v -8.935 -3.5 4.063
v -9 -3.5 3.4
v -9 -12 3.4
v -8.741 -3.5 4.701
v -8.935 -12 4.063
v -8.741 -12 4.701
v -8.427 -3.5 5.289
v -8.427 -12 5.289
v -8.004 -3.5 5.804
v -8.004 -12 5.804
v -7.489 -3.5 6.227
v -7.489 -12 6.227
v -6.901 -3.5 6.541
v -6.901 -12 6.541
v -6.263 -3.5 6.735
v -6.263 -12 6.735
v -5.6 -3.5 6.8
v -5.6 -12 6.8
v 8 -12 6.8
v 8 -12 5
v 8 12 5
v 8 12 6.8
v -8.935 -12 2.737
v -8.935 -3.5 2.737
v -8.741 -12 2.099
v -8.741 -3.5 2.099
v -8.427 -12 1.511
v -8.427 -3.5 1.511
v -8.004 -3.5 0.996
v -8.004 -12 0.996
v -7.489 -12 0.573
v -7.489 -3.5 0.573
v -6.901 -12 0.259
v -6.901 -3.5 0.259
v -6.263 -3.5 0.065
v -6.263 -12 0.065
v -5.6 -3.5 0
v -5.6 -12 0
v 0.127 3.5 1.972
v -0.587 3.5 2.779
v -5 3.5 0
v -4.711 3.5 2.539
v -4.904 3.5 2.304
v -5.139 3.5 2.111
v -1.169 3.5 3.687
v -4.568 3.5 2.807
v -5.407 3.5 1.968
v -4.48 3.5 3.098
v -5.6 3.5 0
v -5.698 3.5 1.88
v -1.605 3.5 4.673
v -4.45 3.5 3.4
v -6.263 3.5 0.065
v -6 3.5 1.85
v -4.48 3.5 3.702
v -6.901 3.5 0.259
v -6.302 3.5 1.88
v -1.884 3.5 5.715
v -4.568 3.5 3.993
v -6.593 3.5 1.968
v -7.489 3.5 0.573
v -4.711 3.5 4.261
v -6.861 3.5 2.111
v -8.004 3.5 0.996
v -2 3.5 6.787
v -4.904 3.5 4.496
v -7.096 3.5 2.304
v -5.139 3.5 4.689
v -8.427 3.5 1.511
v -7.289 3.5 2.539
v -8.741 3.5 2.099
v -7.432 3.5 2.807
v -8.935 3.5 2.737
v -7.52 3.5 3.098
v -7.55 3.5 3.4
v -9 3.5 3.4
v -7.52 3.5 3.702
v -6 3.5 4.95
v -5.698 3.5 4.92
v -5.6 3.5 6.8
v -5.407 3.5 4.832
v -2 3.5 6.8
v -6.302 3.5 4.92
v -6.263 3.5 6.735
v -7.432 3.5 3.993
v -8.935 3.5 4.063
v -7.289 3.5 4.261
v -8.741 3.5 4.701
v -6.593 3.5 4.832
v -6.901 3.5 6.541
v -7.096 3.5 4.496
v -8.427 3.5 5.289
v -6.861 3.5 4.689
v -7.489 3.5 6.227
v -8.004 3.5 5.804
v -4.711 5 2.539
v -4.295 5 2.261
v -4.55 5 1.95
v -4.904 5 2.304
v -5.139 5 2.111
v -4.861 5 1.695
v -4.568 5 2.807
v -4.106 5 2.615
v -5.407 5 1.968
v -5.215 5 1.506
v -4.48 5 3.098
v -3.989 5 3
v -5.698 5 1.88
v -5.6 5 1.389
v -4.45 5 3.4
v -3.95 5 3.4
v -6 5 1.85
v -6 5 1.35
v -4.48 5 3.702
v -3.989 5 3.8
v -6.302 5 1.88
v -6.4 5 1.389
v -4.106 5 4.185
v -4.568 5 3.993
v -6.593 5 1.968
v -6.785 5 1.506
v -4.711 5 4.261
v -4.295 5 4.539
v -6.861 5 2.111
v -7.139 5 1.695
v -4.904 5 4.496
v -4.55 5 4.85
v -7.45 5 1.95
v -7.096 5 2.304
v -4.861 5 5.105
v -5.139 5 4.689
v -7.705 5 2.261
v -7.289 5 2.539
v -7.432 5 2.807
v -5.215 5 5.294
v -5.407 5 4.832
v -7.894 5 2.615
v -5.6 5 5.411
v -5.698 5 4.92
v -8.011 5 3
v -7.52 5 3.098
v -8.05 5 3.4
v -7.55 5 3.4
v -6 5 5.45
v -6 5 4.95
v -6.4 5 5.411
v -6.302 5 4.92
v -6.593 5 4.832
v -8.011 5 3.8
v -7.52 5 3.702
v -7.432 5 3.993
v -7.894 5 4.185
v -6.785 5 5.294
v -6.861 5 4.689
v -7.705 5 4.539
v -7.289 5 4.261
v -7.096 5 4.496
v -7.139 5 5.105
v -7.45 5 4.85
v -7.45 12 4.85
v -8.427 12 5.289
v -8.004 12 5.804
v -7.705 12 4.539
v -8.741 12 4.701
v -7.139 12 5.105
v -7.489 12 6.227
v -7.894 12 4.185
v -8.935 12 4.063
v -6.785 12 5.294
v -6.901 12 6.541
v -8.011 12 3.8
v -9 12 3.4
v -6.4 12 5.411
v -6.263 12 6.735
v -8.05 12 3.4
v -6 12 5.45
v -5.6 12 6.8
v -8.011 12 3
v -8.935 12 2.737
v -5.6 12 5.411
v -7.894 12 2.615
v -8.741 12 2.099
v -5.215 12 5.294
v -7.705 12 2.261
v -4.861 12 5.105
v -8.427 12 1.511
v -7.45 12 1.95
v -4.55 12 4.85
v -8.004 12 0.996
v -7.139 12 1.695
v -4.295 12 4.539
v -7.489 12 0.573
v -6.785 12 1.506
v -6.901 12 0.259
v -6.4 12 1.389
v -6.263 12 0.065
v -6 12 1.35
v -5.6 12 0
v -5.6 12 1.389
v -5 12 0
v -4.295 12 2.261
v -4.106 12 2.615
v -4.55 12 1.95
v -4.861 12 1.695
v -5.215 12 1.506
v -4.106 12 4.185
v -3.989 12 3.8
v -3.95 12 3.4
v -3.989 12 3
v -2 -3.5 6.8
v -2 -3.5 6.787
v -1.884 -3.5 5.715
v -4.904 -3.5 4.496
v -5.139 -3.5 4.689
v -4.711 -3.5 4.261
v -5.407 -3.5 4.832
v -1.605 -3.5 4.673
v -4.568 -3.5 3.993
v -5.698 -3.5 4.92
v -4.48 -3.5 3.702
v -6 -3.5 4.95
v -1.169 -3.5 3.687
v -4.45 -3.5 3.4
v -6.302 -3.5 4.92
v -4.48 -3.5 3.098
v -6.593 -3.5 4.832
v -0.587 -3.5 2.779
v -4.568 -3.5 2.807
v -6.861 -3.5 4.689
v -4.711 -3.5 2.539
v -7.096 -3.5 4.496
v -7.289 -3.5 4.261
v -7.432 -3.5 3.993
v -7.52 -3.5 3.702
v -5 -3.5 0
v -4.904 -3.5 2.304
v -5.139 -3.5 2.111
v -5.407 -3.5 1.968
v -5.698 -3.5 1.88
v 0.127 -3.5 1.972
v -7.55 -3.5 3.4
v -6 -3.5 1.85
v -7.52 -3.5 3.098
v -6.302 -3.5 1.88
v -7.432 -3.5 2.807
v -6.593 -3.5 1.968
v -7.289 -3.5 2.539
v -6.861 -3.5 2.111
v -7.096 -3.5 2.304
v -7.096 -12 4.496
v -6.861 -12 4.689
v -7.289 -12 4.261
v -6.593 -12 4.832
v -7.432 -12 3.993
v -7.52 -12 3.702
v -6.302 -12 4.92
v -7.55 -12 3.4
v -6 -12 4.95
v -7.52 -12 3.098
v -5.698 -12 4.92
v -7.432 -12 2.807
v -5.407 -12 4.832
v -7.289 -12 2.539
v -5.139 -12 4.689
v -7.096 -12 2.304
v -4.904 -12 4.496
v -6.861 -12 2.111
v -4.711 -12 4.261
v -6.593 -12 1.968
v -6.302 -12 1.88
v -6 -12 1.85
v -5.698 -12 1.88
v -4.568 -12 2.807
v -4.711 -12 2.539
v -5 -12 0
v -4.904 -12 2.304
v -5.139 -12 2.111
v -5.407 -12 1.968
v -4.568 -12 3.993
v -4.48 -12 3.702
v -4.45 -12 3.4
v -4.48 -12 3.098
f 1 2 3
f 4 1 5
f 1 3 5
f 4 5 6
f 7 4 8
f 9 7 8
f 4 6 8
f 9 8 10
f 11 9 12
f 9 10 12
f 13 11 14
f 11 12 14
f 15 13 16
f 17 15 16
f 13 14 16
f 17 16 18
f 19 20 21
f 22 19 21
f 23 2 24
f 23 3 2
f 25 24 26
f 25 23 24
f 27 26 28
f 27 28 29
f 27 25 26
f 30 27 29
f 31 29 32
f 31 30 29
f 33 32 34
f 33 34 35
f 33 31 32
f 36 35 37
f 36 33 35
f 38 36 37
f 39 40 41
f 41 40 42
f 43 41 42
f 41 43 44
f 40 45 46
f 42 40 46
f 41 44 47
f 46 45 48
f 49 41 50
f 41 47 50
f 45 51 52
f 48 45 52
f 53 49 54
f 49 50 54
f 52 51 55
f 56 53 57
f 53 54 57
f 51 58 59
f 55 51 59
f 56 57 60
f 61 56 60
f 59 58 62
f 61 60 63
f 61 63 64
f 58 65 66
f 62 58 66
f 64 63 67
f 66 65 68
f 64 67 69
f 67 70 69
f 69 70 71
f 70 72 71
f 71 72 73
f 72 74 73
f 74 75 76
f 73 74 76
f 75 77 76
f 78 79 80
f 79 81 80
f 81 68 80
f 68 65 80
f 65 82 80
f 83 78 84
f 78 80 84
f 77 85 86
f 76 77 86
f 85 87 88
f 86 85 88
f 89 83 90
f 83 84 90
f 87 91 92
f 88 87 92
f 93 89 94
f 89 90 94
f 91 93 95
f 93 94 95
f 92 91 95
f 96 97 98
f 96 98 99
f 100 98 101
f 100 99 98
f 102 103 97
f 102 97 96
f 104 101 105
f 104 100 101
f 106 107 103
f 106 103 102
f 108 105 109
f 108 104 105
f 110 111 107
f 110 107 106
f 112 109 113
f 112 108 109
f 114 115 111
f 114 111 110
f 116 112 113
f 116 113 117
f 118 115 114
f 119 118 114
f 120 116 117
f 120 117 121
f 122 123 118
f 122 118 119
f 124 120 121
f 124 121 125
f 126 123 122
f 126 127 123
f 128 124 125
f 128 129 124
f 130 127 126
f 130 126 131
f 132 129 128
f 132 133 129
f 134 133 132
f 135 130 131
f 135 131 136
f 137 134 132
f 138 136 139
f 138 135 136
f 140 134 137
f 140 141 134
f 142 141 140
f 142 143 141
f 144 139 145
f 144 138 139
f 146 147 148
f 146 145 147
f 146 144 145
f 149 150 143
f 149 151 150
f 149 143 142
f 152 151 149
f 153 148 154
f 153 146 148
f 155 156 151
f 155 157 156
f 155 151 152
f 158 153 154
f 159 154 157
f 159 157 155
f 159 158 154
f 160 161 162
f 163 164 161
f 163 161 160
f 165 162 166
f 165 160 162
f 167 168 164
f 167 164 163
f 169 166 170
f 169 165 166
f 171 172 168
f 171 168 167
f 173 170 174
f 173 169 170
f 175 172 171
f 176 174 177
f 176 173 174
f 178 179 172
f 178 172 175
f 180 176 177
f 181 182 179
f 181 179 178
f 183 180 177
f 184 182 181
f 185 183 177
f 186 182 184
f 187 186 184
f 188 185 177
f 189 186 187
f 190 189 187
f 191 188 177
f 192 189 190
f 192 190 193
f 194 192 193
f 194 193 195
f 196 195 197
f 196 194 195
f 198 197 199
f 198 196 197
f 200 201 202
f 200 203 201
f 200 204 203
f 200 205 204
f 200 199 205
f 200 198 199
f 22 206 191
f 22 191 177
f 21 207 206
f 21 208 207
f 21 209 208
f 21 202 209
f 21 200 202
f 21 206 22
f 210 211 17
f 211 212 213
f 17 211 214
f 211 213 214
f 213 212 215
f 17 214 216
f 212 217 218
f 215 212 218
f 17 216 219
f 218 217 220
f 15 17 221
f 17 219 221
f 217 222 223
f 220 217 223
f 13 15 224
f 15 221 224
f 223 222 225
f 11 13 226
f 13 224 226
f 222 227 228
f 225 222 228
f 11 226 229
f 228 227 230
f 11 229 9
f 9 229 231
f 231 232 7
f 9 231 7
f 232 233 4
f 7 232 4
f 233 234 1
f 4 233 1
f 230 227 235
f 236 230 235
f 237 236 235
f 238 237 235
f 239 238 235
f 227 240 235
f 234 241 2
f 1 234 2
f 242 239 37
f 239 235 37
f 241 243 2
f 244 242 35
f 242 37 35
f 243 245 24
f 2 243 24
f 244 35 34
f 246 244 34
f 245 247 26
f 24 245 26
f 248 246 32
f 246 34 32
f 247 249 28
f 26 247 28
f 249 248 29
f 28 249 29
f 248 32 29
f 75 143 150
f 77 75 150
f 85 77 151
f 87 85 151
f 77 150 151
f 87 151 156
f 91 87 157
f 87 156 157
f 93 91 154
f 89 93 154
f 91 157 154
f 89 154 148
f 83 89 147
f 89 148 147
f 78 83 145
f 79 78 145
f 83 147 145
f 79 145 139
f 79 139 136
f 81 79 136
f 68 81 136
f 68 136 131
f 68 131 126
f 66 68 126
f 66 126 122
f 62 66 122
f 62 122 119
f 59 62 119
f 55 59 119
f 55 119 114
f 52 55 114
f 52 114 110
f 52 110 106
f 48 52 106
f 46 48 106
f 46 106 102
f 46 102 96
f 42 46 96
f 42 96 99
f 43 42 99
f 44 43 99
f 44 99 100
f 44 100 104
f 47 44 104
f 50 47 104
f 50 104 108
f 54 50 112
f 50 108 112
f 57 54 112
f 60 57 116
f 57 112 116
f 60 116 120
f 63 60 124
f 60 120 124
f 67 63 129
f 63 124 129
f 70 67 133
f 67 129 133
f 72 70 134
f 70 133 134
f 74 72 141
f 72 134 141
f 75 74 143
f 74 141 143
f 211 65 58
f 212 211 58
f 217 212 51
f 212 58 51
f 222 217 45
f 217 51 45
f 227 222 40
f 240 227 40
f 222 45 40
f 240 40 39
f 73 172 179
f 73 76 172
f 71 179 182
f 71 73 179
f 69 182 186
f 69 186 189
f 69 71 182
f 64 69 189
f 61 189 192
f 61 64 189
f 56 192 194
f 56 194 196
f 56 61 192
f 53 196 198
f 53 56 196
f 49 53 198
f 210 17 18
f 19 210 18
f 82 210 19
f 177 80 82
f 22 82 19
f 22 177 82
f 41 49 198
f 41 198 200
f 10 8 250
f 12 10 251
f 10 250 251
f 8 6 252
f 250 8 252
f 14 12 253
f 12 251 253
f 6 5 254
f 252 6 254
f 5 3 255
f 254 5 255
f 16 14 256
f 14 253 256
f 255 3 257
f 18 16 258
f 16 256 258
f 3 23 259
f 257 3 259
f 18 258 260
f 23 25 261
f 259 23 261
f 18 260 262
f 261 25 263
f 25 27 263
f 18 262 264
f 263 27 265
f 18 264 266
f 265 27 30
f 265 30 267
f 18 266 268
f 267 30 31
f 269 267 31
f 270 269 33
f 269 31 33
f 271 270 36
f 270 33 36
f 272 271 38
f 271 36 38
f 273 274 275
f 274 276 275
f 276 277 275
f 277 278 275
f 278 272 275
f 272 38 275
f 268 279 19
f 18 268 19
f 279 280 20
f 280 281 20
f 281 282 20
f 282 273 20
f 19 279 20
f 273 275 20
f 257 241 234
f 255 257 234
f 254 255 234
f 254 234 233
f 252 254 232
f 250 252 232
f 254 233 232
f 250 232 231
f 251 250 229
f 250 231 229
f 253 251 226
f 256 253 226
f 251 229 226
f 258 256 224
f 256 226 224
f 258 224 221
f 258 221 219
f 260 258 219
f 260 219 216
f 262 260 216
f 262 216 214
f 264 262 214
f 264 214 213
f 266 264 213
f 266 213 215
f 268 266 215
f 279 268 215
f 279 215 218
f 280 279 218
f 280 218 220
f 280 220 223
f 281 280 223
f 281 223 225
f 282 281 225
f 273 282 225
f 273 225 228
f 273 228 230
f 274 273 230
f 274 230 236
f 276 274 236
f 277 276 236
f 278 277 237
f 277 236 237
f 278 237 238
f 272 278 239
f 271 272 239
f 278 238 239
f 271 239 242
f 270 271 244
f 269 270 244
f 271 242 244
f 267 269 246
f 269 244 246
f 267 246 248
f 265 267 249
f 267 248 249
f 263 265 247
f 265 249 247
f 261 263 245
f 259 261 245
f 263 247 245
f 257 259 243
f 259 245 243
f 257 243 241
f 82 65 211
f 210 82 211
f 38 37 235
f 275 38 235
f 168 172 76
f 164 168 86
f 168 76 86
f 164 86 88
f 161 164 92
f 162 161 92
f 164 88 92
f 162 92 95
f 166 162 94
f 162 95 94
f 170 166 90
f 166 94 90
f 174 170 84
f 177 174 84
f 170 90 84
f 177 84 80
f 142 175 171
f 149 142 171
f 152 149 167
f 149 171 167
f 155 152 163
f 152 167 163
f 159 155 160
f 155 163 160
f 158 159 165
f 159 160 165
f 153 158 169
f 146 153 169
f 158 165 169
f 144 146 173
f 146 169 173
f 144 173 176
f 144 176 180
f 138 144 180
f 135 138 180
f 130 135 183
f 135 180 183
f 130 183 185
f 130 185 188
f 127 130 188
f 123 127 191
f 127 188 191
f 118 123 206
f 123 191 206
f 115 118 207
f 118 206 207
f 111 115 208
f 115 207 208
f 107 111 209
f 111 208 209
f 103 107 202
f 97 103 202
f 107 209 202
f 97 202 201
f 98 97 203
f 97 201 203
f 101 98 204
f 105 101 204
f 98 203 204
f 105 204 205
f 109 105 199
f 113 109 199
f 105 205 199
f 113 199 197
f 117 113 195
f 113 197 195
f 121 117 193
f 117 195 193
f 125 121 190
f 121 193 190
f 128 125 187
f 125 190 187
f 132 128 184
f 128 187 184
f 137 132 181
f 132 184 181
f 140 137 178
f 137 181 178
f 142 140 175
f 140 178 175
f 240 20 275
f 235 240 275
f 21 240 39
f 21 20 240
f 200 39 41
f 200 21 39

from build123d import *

# Parameters (mm, degrees)
F1_DEPTH    = 6.8
F2_R        = 3.39999
F3_R        = 1.55
F4_DEPTH    = 24.001
F3_R_2      = 2.05
F5_DEPTH    = 7
F0_W        = 8
F0_H        = 24
F6_DEPTH    = 6.8
F7_T1_DEPTH = 7
F8_T1_DEPTH = 91.4331581264


# Not quite as in the source:
# - a fillet or chamfer that OpenCascade refuses, or shapes differently, is made with other operations: its cross-section is extruded or revolved along the edge and cut away or added
# - a fillet or chamfer is up to 0.001 mm smaller than in the source, because OpenCascade refuses the exact size
# - a feature names something its author has since deleted; it is built from what else it names


with BuildPart() as f1:
    # F0 (on Top) → F1 (new body)
    with BuildSketch(Plane.XY):
        Polygon((-2, -12), (0, -12), (0, 12), (-2, 12), (-9, 12), (-9, 3.5), (-2, 3.5), (-2, -3.5), (-9, -3.5), (-9, -12), align=None)
    extrude(amount=F1_DEPTH)

    # F2 (radius 3.4 in the source; OpenCascade refuses exactly that, so slightly less here)
    f2_edges = [f1.edges().sort_by_distance(p)[0] for p in [
        (-9, 7.75, 6.8),
        (-9, 7.75, 0),
        (-9, -7.75, 0),
        (-9, -7.75, 6.8),
    ]]
    fillet(f2_edges, radius=F2_R)

    # F3 (on face) → F4 (cut, through all)
    with BuildSketch(Plane(origin=(0, 12, 0), x_dir=(-1, 0, 0), z_dir=(0, 1, 0))):
        with Locations((6, 3.4)):
            Circle(F3_R)
    extrude(amount=-F4_DEPTH, mode=Mode.SUBTRACT)

    # F3 (on face) → F5 (cut)
    with BuildSketch(Plane(origin=(0, 12, 0), x_dir=(-1, 0, 0), z_dir=(0, 1, 0))):
        with Locations((6, 3.4)):
            Circle(F3_R_2)
        with Locations((6, 3.4)):
            Circle(F3_R, mode=Mode.SUBTRACT)
    extrude(amount=-F5_DEPTH, mode=Mode.SUBTRACT)

    # F0 (on Top) → F6 (join, through all)
    with BuildSketch(Plane.XY):
        with Locations((4, 0)):
            Rectangle(F0_W, F0_H)
    extrude(amount=F6_DEPTH)

    # F7: fillet of radius 7 on 1 edges, made by hand

    # F7_s2 → F7_t1 (cut)
    with BuildSketch(Plane.XZ.offset(-3.5)):
        with BuildLine():
            ThreePointArc((-2.0003998352, 6.7999885178), (0.1189410708, 1.9796991069), (4.9980806884, -0.0004))
            Line((4.9980806884, -0.0004), (4.9980806884, -0.7005365685))
            ThreePointArc((4.9980806884, -0.7005365685), (1.4990403442, -0.7001365685), (-2, -0.7001365685))
            Line((-2, -0.7001365685), (-2.7001365685, 0))
            ThreePointArc((-2.7001365685, 0), (-2.7001365685, 3.3999942589), (-2.7002478875, 6.7798908011))
            Line((-2.7002478875, 6.7798908011), (-2.0003998352, 6.7999885178))
        make_face()
    extrude(amount=F7_T1_DEPTH, mode=Mode.SUBTRACT)

    # F8: chamfer of 5 x 13 on 1 edges, made by hand

    # F8_s2 → F8_t1 (cut)
    with BuildSketch(Plane.XZ.offset(-45.7165790632)):
        Polygon((8, 5), (-5, 0), (8, 0), align=None)
    extrude(amount=F8_T1_DEPTH, mode=Mode.SUBTRACT)


solid = f1.part
